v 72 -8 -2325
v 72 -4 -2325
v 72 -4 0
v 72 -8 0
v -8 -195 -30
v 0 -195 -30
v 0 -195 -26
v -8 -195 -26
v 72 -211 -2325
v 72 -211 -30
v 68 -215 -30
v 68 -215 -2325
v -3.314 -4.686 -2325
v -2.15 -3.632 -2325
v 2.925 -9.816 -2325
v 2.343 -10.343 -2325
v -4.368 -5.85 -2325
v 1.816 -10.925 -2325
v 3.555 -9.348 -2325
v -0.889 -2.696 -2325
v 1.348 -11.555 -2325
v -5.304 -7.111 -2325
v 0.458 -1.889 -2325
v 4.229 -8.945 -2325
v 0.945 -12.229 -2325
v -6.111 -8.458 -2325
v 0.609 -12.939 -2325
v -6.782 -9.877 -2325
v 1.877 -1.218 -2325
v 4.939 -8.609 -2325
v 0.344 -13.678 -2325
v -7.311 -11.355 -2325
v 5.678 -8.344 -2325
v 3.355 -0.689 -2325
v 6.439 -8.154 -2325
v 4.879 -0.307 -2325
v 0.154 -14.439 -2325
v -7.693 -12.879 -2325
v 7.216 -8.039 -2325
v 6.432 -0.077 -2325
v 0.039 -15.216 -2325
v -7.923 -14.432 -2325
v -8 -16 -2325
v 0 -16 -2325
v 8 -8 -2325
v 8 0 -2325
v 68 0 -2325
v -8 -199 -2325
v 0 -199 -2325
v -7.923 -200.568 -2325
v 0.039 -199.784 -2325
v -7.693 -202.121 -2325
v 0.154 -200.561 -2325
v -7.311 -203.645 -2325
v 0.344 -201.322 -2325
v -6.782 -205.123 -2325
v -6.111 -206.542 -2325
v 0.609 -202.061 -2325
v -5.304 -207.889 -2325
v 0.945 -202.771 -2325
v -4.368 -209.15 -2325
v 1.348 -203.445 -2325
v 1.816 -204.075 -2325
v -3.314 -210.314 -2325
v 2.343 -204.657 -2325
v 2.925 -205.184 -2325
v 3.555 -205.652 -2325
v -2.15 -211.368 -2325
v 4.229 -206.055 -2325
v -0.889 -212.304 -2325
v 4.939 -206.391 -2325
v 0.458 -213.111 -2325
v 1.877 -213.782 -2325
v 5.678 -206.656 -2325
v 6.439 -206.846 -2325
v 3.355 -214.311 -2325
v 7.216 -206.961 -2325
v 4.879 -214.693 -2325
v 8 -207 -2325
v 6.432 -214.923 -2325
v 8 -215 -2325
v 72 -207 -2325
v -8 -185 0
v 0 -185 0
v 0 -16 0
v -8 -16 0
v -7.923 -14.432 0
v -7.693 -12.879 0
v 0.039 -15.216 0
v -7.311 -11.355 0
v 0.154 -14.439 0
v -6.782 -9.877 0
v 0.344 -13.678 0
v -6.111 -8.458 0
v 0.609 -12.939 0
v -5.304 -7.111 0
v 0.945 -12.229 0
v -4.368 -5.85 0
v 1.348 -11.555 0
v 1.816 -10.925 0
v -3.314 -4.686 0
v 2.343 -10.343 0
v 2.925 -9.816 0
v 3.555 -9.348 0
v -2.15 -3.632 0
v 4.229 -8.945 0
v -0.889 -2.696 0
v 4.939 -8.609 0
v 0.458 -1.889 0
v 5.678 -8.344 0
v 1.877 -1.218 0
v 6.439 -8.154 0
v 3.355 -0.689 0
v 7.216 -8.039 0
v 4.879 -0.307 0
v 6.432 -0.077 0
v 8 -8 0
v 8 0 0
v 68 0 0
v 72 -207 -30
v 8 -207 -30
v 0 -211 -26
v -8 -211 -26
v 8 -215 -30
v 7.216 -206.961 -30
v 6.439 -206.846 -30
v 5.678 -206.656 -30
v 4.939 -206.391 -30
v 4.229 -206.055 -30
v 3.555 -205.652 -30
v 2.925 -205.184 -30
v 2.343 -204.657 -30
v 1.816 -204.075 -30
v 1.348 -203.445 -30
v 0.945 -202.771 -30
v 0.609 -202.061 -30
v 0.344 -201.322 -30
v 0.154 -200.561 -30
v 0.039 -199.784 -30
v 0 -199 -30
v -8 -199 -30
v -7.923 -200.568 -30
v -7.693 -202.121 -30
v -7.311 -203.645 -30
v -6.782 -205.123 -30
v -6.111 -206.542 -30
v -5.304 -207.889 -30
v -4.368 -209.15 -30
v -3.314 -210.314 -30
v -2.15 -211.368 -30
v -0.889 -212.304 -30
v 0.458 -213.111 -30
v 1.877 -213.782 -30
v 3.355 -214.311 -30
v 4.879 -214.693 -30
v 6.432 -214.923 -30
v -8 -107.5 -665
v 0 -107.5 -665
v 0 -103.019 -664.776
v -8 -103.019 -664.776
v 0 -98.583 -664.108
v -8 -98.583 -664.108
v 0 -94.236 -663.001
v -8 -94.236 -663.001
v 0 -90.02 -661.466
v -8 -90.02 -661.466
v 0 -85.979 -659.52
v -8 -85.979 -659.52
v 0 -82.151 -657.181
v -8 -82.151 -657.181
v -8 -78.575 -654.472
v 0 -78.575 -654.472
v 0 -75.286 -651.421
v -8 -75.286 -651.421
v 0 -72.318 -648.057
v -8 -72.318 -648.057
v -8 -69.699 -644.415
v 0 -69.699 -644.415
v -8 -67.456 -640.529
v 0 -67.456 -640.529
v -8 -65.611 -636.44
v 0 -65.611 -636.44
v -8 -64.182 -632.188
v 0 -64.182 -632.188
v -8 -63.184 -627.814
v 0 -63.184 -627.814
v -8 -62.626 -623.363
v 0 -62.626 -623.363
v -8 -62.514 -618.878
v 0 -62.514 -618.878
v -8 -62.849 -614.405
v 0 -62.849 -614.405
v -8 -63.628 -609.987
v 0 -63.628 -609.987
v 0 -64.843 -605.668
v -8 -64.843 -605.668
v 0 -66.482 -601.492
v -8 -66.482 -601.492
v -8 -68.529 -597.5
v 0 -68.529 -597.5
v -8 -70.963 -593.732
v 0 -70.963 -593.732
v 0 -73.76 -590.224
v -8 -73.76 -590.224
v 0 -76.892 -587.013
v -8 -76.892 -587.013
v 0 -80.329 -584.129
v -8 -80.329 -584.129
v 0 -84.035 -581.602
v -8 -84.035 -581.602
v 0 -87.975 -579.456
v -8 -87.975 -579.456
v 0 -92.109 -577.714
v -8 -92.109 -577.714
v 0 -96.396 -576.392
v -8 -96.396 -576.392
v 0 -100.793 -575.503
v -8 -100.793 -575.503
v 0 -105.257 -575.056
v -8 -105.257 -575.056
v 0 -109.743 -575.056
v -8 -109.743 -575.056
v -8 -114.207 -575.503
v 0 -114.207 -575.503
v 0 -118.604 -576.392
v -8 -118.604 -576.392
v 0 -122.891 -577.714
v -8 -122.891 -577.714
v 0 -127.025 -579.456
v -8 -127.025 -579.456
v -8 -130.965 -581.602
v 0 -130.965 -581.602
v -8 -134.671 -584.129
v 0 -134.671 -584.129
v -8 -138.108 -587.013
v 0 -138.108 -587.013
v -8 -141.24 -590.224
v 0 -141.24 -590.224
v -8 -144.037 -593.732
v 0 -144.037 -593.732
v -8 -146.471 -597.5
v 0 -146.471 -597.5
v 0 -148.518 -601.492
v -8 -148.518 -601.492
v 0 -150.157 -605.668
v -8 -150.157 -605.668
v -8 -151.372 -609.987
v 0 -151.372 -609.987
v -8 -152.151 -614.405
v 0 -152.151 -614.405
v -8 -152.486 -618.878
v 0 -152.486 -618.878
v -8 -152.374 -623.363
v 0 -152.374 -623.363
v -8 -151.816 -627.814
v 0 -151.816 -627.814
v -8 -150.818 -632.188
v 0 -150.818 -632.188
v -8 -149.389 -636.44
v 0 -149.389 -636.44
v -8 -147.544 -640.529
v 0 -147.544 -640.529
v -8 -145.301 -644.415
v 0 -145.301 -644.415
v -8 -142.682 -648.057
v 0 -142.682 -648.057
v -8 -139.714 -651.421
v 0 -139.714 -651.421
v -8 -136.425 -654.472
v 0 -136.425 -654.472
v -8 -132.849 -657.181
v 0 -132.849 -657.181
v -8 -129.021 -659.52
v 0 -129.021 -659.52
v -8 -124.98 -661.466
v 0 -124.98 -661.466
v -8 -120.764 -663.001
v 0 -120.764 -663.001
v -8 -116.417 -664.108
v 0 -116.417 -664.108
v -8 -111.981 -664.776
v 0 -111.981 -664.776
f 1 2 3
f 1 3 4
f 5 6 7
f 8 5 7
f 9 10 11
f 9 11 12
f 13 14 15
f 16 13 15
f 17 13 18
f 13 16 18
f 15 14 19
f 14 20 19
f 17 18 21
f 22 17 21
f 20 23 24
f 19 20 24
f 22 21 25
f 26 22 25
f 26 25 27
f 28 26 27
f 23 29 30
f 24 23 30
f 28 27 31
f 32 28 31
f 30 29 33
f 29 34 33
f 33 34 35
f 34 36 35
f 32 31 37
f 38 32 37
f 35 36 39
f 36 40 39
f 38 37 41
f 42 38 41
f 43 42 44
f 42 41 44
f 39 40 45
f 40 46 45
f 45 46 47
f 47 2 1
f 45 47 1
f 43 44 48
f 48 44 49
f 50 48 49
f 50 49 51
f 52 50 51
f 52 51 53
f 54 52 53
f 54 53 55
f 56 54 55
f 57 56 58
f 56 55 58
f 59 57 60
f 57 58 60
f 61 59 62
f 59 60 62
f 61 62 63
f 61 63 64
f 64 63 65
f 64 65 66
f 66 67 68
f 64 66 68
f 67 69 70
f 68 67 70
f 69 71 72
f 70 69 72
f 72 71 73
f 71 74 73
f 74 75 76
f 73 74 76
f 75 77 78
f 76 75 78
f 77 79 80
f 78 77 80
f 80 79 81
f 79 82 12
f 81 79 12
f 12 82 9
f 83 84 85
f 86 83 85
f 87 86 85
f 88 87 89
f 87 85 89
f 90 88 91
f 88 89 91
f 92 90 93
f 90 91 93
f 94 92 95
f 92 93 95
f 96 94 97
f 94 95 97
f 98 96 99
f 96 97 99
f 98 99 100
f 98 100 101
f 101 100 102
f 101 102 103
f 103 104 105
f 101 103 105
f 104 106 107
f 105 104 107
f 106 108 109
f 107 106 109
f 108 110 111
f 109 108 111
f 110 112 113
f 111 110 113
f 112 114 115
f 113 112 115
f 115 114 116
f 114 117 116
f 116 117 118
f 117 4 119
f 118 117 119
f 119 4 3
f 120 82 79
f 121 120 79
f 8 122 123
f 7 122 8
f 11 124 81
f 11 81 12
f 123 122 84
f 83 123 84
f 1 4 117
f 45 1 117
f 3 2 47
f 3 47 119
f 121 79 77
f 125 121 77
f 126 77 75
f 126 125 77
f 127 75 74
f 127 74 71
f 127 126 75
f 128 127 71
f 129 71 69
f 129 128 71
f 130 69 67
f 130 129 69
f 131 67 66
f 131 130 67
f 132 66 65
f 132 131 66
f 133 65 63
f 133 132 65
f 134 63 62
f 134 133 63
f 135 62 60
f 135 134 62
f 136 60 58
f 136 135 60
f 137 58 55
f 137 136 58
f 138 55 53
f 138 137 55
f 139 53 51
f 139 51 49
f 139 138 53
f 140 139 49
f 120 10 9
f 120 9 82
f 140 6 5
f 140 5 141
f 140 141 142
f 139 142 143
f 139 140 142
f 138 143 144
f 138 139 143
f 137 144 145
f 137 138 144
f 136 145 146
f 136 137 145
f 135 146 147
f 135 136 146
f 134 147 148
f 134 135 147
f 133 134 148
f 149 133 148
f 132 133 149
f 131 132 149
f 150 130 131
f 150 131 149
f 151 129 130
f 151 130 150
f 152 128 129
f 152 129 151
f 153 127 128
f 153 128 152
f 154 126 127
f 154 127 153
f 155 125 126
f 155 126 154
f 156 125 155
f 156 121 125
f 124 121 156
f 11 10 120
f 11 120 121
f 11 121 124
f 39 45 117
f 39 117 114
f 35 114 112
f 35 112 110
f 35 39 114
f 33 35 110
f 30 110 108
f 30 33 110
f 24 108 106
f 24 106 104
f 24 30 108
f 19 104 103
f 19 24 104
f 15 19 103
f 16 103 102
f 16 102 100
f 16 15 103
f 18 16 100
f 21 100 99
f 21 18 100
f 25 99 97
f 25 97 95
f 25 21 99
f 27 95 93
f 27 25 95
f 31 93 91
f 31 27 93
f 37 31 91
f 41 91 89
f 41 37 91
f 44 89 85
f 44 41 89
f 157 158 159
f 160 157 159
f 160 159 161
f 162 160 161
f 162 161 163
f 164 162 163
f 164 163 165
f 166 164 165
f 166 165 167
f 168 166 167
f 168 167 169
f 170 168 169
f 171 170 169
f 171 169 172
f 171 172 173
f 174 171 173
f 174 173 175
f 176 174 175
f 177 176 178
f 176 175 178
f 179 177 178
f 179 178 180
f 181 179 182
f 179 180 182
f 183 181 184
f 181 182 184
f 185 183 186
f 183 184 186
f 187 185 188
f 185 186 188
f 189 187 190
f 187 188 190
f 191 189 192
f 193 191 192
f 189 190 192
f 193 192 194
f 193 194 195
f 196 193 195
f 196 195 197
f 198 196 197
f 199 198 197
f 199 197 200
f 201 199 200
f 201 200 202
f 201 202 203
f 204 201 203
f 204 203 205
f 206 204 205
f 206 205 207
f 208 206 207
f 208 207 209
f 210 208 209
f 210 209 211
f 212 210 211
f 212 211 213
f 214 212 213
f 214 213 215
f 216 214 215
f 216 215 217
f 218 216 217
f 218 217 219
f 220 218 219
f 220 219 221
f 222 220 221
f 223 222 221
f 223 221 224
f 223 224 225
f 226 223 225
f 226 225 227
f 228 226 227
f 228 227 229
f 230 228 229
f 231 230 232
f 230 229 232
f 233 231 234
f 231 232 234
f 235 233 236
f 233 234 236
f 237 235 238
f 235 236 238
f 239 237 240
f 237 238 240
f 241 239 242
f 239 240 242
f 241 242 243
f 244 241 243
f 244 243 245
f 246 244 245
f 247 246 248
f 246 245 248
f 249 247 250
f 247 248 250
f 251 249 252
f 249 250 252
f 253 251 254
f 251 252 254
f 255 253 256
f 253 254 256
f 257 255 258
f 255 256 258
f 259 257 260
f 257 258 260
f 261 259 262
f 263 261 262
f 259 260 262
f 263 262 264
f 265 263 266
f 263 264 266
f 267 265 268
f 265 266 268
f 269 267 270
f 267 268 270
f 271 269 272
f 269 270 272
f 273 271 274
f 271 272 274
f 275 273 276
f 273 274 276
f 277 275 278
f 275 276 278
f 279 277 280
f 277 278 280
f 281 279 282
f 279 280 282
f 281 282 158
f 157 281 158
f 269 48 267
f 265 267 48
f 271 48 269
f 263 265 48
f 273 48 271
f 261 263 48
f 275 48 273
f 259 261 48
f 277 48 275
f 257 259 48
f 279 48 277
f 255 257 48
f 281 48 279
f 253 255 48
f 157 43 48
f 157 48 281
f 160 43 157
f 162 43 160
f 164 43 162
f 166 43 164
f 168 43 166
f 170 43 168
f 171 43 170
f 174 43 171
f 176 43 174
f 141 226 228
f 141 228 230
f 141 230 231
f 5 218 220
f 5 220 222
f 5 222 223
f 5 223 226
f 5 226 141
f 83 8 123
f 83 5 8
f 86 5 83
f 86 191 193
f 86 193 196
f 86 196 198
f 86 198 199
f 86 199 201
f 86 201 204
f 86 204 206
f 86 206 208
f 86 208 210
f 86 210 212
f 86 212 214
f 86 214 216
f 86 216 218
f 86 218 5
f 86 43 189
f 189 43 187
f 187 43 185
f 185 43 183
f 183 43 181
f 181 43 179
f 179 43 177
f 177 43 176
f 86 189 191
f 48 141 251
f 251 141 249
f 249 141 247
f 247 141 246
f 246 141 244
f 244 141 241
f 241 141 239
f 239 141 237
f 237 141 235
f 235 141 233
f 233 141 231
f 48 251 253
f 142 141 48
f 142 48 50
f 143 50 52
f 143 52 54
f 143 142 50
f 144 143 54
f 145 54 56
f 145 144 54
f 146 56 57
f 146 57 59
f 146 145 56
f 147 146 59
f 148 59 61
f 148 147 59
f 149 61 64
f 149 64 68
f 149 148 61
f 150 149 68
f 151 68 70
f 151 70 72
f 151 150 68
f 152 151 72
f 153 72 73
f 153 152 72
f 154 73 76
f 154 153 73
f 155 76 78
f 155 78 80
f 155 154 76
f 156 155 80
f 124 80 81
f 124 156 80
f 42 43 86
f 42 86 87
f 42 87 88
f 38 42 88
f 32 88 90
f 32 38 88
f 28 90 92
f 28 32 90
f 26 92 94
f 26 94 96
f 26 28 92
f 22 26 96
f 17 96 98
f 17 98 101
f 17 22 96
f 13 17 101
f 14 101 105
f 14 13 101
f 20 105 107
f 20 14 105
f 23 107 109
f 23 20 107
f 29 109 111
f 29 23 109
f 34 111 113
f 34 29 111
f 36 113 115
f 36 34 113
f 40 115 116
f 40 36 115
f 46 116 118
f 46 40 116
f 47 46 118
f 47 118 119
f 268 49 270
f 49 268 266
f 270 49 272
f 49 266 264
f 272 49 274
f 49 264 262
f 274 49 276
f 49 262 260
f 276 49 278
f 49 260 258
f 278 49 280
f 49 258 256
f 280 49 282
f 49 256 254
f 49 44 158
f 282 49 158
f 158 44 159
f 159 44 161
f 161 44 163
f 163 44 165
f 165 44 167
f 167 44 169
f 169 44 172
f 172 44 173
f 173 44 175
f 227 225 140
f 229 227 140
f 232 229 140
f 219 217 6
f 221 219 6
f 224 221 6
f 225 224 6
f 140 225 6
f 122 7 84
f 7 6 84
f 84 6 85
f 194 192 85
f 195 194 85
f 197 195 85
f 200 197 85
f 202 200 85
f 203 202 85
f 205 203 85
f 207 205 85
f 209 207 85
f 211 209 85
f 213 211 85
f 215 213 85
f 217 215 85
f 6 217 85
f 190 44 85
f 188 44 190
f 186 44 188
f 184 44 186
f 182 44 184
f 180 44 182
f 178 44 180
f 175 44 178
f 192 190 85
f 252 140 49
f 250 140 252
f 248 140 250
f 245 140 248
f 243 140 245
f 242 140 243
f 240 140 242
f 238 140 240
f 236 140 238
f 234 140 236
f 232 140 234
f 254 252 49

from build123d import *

# Parameters (mm, degrees)
SM_BASE_FLANGE_1_DEPTH             = 8
SM_EDGE_FLANGE_1_STRIP_W           = 48
SM_EDGE_FLANGE_1_STRIP_H           = 8
SM_EDGE_FLANGE_1_STRIP_CUT_DEPTH   = 2325
SM_EDGE_FLANGE_1_STRIP_2_W         = 48
SM_EDGE_FLANGE_1_STRIP_2_H         = 8
SM_EDGE_FLANGE_1_STRIP_CUT_2_DEPTH = 2295
SM_EDGE_FLANGE_1_RELIEF_W          = 52
SM_EDGE_FLANGE_1_RELIEF_H          = 4
SM_EDGE_FLANGE_1_RELIEF_CUT_DEPTH  = 8
SM_EDGE_FLANGE_1_DEPTH             = 2325
SM_EDGE_FLANGE_1_BEND_DEPTH        = 2295
CHAMFER_1_SIZE                     = 4
SKETCH_12_R                        = 45
CUT_EXTRUDE_1_DEPTH                = 2337.029537484


# Sheet-metal steps are written as plain solids
with BuildPart() as part:
    # Sketch 1 → 基体-法兰1 (new body)
    with BuildSketch(Plane(origin=(0, 0, 0), x_dir=(0, 0, -1), z_dir=(1, 0, 0))):
        Polygon((0, 0), (2325, 0), (2325, -215), (30, -215), (0, -185), align=None)
    extrude(amount=-SM_BASE_FLANGE_1_DEPTH)

    # 边线-法兰1 strip (across the edge) → 边线-法兰1 strip cut (cut)
    with BuildSketch(Plane(origin=(0, 0, -2325), x_dir=(0, -1, 0), z_dir=(0, 0, 1))):
        with Locations((-8, -4)):
            Rectangle(SM_EDGE_FLANGE_1_STRIP_W, SM_EDGE_FLANGE_1_STRIP_H)
    extrude(amount=SM_EDGE_FLANGE_1_STRIP_CUT_DEPTH, mode=Mode.SUBTRACT)

    # 边线-法兰1 strip 2 (across the edge) → 边线-法兰1 strip cut 2 (cut)
    with BuildSketch(Plane(origin=(0, -215, -30), x_dir=(0, 1, 0), z_dir=(0, 0, -1))):
        with Locations((-8, -4)):
            Rectangle(SM_EDGE_FLANGE_1_STRIP_2_W, SM_EDGE_FLANGE_1_STRIP_2_H)
    extrude(amount=SM_EDGE_FLANGE_1_STRIP_CUT_2_DEPTH, mode=Mode.SUBTRACT)

    # 边线-法兰1 relief (on the sheet) → 边线-法兰1 relief cut (cut)
    with BuildSketch(Plane(origin=(0, -199, -30), x_dir=(0, 1, 0), z_dir=(1, 0, 0))):
        with Locations((-22, 2)):
            Rectangle(SM_EDGE_FLANGE_1_RELIEF_W, SM_EDGE_FLANGE_1_RELIEF_H)
    extrude(amount=-SM_EDGE_FLANGE_1_RELIEF_CUT_DEPTH, mode=Mode.SUBTRACT)

    # 边线-法兰1 section (across the edge) → 边线-法兰1 (add)
    with BuildSketch(Plane(origin=(0, 0, -2325), x_dir=(0, -1, 0), z_dir=(0, 0, 1))):
        with BuildLine():
            Line((0, 8), (0, 72))
            Line((0, 72), (8, 72))
            Line((8, 72), (8, 8))
            ThreePointArc((8, 8), (10.343145751, 2.343145751), (16, 0))
            Line((16, 0), (16, -8))
            ThreePointArc((16, -8), (4.686291501, -3.313708499), (0, 8))
        make_face()
    extrude(amount=SM_EDGE_FLANGE_1_DEPTH)

    # 边线-法兰1 section 2 (across the edge) → 边线-法兰1 bend (add)
    with BuildSketch(Plane(origin=(0, -215, -30), x_dir=(0, 1, 0), z_dir=(0, 0, -1))):
        with BuildLine():
            Line((0, 8), (0, 72))
            Line((0, 72), (8, 72))
            Line((8, 72), (8, 8))
            ThreePointArc((8, 8), (10.343145751, 2.343145751), (16, 0))
            Line((16, 0), (16, -8))
            ThreePointArc((16, -8), (4.686291501, -3.313708499), (0, 8))
        make_face()
    extrude(amount=SM_EDGE_FLANGE_1_BEND_DEPTH)

    # 倒角1
    chamfer_1_edges = [part.edges().sort_by_distance(p)[0] for p in [
        (72, 0, -1162.5),
        (72, -215, -1177.5),
    ]]
    chamfer(chamfer_1_edges, length=CHAMFER_1_SIZE)

    # 草图12 → 切除-拉伸1 (cut, through all)
    with BuildSketch(Plane(origin=(0, 0, 0), x_dir=(0, 0, -1), z_dir=(1, 0, 0))):
        with Locations((620, -107.5)):
            Circle(SKETCH_12_R)
    extrude(amount=-CUT_EXTRUDE_1_DEPTH, mode=Mode.SUBTRACT)


solid = part.part
